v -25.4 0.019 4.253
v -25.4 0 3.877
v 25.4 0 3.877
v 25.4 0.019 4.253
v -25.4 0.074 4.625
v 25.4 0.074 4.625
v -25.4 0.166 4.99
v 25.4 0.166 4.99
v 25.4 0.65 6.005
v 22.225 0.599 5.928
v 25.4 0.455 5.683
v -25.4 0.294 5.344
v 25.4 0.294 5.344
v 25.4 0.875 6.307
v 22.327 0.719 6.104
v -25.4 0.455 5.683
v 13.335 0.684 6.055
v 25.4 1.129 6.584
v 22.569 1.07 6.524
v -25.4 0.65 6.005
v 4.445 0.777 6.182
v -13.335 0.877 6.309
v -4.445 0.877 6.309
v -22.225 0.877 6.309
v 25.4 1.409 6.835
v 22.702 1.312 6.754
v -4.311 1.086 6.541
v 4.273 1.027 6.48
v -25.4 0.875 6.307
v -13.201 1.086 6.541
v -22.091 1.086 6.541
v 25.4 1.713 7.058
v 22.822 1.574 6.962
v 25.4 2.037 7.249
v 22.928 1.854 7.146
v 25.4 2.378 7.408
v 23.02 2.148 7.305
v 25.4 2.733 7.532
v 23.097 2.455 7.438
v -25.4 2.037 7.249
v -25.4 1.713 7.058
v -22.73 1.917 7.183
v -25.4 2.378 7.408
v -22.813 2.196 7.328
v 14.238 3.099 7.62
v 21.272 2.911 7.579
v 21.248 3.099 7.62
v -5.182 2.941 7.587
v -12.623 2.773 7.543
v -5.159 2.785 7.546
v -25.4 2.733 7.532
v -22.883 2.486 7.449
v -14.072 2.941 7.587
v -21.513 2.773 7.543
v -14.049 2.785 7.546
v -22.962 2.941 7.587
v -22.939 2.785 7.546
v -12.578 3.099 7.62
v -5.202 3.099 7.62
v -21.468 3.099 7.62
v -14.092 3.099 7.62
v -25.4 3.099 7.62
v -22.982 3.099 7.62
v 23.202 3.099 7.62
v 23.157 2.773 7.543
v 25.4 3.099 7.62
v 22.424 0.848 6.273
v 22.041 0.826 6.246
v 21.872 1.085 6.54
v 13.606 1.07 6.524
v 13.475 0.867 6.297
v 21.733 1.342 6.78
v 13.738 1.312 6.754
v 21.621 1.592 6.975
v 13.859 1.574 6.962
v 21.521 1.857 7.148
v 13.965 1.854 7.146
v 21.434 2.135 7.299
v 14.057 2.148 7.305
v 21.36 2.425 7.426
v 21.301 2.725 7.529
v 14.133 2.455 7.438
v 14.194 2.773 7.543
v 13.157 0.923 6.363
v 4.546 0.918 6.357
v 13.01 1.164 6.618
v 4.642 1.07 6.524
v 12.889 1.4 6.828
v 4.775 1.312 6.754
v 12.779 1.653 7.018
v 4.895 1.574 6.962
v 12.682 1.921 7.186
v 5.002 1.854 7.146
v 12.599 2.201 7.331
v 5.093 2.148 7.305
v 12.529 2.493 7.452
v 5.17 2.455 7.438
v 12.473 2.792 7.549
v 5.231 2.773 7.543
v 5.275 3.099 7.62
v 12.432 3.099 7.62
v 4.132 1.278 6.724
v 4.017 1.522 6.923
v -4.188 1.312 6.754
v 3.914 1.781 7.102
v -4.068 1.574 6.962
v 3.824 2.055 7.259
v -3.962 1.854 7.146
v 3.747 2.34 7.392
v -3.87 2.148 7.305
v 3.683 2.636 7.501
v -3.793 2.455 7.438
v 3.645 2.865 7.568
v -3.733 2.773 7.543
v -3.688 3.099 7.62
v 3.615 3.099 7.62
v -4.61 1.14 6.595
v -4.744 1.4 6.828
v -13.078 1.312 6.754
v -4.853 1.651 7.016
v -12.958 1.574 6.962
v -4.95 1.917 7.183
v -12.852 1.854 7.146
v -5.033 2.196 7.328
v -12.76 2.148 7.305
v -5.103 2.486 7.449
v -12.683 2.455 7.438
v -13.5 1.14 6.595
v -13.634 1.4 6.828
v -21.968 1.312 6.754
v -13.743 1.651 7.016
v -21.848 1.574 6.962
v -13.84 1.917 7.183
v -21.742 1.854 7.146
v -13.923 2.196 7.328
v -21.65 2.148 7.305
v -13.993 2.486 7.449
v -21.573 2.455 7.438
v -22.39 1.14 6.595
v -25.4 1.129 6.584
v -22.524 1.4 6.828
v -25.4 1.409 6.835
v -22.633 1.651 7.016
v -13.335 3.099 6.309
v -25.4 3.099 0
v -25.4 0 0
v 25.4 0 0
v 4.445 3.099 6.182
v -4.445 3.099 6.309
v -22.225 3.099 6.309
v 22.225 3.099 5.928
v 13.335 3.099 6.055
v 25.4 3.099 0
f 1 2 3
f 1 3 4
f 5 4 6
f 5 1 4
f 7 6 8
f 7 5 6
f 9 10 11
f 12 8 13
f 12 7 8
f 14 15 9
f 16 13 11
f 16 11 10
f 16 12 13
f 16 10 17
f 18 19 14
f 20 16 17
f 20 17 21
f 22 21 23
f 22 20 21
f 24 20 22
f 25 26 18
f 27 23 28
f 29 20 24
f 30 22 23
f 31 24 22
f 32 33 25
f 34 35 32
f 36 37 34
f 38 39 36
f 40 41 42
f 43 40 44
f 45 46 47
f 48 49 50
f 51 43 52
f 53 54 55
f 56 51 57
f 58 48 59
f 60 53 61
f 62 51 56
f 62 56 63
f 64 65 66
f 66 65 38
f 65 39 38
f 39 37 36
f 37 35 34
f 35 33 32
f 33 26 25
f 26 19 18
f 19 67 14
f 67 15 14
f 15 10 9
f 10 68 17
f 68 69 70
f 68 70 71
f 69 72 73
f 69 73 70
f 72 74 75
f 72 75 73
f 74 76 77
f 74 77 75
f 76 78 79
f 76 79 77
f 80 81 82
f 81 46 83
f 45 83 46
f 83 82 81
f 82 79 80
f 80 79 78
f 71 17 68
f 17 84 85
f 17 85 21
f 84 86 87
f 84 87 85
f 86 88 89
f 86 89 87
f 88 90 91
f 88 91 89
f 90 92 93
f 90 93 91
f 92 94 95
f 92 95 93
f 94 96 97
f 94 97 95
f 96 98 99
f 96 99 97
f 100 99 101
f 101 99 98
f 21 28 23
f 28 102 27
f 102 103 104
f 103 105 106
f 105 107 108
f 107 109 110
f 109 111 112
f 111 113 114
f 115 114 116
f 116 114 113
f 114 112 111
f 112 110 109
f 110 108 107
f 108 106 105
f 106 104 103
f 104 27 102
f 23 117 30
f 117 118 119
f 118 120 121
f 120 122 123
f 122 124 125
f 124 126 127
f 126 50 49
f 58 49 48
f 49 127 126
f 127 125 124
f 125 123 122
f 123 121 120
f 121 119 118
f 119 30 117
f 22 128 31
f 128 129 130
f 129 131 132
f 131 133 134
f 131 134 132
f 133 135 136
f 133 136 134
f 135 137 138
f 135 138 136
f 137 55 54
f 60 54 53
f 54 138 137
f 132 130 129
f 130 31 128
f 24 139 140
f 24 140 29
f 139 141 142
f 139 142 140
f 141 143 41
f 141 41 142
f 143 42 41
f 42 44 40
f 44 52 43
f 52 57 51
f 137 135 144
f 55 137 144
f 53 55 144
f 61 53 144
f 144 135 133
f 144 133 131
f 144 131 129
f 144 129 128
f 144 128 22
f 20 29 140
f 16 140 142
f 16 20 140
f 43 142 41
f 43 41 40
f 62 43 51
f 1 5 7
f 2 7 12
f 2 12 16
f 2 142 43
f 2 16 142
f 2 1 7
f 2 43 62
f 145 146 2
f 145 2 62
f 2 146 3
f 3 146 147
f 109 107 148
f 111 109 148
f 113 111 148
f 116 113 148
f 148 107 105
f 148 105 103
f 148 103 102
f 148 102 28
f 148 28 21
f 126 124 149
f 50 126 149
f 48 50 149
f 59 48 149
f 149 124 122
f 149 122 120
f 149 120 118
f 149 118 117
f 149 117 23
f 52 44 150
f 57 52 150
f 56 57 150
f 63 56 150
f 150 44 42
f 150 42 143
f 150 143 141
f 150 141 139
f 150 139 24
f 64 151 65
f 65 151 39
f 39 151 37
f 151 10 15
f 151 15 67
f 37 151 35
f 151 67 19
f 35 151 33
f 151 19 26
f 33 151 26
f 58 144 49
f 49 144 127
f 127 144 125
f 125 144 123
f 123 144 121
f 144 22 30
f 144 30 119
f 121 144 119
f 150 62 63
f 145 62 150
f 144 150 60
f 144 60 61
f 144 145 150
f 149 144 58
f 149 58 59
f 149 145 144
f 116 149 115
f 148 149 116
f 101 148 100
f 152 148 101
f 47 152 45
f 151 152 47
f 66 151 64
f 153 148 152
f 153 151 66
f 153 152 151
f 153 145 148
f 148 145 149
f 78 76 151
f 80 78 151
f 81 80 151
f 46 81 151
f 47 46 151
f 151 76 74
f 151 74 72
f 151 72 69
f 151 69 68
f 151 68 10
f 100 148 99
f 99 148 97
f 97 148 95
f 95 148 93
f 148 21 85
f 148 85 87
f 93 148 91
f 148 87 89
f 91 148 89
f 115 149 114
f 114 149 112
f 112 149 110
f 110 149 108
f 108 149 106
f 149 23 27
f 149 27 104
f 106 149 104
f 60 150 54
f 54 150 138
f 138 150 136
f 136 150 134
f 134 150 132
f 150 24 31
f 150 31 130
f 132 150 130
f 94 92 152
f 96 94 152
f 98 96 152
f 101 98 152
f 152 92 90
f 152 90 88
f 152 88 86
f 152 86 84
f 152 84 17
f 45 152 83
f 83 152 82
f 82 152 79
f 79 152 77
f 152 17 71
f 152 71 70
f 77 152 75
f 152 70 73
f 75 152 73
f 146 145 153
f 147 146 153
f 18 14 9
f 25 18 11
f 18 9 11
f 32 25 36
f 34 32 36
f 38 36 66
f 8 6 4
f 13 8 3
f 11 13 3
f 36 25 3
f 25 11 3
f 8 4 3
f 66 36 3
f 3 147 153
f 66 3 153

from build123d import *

# Parameters (mm, degrees)
F0_W        = 50.8
F0_H        = 3.0988
F1_DEPTH    = 7.62
F3_T1_DEPTH = 69.5151640121
F4_DEPTH    = 25.4


# Not quite as in the source:
# - a fillet or chamfer that OpenCascade refuses, or shapes differently, is made with other operations: its cross-section is extruded or revolved along the edge and cut away or added


with BuildPart() as f1:
    # F0 (on Top) → F1 (new body)
    with BuildSketch(Plane.XY):
        with Locations((0, 1.5494)):
            Rectangle(F0_W, F0_H)
    extrude(amount=F1_DEPTH)

    # F3: fillet of radius 3.81 on 1 edges, made by hand

    # F3_s2 → F3_t1 (cut)
    with BuildSketch(Plane.YZ.offset(-34.7575820061)):
        with BuildLine():
            ThreePointArc((0, 3.8769671976), (0.8752281179, 6.3066202592), (3.0988, 7.62))
            Line((3.0988, 7.62), (0, 7.62))
            Line((0, 7.62), (0, 3.8769671976))
        make_face()
    extrude(amount=F3_T1_DEPTH, mode=Mode.SUBTRACT)

    # F2 (on face) → F4 (cut)
    with BuildSketch(Plane.XZ):
        Polygon((-22.225, 6.3092954744), (-21.4682643893, 7.62), (-22.9817356107, 7.62), align=None)
        Polygon((-12.5782643893, 7.62), (-14.0917356107, 7.62), (-13.335, 6.3092954744), align=None)
        Polygon((14.2383825791, 7.62), (12.4316174209, 7.62), (13.335, 6.0552954744), align=None)
        Polygon((22.225, 5.9282954744), (23.2017060633, 7.62), (21.2482939367, 7.62), align=None)
        Polygon((-3.6882643893, 7.62), (-5.2017356107, 7.62), (-4.445, 6.3092954744), align=None)
        Polygon((5.2750590949, 7.62), (3.6149409051, 7.62), (4.445, 6.1822954744), align=None)
    extrude(amount=-F4_DEPTH, mode=Mode.SUBTRACT)


solid = f1.part
